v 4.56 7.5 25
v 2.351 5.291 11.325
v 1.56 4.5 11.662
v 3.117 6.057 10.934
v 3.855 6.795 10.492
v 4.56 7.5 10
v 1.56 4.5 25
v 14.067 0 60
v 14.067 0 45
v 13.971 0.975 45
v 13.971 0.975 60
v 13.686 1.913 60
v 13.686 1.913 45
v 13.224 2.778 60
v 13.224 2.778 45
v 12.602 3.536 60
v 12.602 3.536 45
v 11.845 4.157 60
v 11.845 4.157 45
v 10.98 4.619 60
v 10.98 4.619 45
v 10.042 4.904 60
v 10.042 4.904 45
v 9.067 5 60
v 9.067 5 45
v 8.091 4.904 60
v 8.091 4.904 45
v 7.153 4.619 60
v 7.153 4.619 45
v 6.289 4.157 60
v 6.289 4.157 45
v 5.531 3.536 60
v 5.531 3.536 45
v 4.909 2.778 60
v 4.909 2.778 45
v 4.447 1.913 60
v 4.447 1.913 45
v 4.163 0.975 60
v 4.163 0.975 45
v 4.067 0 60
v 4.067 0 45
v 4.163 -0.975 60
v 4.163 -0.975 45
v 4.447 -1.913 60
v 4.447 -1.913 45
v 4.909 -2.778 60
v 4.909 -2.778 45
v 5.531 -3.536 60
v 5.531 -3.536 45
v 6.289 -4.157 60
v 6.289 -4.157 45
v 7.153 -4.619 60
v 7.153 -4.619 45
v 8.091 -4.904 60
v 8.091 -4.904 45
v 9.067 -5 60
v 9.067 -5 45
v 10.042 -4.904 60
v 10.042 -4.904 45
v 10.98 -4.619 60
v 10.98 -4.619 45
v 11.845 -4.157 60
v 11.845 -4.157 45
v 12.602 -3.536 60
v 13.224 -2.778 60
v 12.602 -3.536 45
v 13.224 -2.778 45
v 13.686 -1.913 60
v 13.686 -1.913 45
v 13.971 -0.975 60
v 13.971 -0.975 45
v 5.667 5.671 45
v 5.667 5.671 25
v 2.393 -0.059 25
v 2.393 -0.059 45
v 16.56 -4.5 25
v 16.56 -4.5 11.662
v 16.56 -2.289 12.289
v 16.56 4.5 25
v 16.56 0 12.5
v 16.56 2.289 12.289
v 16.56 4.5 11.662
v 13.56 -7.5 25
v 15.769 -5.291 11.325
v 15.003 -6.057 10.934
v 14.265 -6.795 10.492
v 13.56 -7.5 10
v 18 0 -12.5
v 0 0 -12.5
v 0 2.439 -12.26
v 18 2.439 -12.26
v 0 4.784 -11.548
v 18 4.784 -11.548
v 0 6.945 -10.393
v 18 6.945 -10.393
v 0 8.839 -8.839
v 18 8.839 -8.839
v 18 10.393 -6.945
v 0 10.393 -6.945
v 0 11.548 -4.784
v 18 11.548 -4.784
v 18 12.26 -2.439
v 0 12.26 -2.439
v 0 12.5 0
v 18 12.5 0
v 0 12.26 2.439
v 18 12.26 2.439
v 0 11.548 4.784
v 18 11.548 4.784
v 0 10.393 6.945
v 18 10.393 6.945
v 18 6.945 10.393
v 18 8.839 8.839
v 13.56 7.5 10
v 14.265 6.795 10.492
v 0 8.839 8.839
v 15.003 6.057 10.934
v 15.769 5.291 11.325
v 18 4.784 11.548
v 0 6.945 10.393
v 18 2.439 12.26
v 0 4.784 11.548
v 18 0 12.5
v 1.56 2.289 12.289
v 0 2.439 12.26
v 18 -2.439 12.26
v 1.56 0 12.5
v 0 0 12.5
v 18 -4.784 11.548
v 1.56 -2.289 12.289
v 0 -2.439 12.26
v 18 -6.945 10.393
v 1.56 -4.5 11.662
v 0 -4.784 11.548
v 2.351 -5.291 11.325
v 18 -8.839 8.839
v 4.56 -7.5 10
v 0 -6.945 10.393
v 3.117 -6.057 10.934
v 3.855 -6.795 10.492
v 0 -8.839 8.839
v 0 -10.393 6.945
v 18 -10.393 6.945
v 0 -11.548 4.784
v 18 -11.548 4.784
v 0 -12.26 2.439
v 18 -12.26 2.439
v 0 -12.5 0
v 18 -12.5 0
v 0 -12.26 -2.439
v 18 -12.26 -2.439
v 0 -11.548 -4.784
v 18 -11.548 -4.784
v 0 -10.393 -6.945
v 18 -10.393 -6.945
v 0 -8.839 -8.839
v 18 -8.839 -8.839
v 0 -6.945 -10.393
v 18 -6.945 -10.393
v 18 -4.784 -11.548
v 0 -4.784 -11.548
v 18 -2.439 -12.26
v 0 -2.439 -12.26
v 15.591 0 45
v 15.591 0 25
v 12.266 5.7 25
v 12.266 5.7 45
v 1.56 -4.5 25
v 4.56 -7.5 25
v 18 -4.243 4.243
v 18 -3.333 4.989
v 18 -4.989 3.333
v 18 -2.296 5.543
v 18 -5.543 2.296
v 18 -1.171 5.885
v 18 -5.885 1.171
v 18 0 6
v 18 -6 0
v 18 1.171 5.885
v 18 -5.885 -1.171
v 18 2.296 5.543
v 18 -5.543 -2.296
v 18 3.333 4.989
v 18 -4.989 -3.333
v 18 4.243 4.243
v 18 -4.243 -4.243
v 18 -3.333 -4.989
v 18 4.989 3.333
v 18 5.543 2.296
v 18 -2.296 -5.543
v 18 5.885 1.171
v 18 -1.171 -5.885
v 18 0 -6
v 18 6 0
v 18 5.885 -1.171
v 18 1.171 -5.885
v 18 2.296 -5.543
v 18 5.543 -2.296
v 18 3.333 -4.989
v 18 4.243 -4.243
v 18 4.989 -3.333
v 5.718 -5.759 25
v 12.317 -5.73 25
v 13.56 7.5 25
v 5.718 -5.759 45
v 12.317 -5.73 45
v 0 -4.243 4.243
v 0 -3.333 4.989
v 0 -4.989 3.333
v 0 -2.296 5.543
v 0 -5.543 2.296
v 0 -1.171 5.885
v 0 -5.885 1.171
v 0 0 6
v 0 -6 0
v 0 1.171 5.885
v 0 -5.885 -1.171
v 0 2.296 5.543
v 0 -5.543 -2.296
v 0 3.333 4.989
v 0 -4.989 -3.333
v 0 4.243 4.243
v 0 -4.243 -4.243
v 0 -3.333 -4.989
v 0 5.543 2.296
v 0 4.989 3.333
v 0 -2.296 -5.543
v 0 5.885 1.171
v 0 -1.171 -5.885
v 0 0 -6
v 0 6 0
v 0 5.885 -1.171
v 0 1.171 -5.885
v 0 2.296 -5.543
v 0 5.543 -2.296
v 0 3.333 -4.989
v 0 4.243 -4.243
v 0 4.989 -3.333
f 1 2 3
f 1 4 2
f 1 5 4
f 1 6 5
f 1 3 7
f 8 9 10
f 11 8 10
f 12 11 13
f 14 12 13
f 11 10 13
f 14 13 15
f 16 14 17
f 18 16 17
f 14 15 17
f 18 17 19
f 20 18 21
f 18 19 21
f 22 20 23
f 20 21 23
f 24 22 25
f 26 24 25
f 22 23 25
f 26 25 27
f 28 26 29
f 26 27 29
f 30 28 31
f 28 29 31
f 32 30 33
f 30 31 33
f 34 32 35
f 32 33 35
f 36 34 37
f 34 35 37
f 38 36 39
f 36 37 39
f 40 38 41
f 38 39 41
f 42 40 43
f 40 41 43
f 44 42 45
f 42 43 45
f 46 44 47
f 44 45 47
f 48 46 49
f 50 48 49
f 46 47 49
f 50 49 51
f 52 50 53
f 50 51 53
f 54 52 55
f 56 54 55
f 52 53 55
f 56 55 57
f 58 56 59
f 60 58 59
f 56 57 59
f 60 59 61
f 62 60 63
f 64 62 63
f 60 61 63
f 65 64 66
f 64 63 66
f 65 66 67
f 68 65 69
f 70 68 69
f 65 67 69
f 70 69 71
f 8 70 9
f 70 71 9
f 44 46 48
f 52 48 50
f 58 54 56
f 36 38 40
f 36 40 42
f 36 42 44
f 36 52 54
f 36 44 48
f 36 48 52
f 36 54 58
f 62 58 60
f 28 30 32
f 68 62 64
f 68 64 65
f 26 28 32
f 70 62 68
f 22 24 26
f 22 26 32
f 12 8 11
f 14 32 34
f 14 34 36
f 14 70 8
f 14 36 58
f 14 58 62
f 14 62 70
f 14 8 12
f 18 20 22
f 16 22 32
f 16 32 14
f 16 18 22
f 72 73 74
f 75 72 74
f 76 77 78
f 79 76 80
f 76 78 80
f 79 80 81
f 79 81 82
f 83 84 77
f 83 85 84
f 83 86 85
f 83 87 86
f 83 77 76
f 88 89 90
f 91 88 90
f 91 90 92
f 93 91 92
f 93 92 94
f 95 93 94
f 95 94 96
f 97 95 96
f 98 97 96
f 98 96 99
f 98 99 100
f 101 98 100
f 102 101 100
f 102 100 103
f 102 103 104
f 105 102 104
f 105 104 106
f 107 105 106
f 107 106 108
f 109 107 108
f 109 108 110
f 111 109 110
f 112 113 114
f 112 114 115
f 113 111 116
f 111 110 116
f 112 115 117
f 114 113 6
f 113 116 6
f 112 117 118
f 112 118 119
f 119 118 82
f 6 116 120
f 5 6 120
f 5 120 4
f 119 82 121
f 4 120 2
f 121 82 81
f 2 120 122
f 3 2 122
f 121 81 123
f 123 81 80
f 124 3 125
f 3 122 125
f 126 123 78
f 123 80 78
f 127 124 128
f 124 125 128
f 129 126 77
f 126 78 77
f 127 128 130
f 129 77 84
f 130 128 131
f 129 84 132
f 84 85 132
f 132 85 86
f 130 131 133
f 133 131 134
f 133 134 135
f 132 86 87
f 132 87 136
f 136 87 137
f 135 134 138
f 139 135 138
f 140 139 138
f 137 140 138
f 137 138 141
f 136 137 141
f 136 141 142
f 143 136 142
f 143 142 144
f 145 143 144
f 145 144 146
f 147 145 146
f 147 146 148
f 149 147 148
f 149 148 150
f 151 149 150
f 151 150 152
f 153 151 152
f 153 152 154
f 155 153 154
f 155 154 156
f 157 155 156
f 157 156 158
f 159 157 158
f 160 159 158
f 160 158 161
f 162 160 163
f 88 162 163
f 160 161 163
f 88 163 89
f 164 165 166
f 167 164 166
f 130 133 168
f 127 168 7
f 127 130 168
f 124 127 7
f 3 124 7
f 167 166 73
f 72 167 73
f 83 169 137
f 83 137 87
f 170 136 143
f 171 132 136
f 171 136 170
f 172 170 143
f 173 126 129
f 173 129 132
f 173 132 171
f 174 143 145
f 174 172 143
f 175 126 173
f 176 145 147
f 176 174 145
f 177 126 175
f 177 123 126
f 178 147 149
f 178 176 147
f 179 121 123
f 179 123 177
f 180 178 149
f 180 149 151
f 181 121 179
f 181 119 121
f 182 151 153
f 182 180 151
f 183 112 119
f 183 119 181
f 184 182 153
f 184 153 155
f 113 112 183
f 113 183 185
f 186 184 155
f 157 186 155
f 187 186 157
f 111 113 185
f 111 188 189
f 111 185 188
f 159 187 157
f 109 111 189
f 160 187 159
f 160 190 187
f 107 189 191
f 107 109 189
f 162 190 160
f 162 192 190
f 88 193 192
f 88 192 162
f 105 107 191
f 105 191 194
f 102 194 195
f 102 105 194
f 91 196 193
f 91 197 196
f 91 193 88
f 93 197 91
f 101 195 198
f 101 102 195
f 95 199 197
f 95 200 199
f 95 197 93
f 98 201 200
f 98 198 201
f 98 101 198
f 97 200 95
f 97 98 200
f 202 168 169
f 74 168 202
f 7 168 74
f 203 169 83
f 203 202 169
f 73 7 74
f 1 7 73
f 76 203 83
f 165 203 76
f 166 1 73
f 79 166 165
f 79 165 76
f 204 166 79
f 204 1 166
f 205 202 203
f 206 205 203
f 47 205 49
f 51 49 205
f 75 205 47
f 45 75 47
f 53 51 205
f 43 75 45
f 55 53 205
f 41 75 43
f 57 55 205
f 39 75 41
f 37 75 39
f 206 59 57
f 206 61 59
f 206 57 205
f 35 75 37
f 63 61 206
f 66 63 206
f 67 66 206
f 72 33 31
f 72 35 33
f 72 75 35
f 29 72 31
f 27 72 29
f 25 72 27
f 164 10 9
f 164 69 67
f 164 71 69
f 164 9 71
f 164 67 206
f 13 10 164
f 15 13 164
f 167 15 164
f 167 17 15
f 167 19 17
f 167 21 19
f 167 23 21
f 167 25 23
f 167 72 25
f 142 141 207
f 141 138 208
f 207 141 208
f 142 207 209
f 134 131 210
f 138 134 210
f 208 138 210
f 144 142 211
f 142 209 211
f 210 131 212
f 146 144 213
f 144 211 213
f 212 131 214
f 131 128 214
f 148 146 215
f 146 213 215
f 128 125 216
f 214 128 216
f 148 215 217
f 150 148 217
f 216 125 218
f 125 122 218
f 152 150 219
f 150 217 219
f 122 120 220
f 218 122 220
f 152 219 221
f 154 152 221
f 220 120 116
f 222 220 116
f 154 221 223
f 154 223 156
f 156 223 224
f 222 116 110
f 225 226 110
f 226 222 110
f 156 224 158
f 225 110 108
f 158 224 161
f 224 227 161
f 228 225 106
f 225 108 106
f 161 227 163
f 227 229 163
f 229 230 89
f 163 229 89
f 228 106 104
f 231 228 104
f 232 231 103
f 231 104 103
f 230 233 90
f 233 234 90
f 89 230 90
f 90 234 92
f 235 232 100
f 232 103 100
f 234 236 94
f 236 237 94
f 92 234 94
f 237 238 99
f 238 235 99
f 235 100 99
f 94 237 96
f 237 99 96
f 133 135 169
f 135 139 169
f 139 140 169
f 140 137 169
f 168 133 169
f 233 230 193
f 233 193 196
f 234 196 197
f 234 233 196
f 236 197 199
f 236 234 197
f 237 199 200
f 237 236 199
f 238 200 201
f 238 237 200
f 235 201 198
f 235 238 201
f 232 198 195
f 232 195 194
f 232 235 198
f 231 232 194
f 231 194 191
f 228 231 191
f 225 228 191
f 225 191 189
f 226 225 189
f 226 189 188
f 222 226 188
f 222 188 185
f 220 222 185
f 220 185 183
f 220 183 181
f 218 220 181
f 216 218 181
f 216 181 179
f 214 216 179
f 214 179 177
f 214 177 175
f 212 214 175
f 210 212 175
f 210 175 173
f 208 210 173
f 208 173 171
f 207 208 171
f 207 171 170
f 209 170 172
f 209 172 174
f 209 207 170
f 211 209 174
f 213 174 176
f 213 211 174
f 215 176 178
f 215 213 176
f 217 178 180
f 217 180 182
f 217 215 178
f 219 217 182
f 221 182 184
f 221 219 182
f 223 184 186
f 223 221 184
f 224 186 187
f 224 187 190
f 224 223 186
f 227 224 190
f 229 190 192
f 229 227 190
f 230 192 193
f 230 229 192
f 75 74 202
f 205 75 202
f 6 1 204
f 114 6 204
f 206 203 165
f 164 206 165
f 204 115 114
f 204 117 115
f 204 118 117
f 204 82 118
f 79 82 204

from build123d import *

# Parameters (mm, degrees)
SKETCH1_R               = 12.5
SKETCH1_R_2             = 6
BOSS_EXTRUDE1_DEPTH     = 18
SKETCH2_W               = 15
SKETCH2_H               = 15
BOSS_EXTRUDE2_DEPTH     = 25
BOSS_EXTRUDE3_DEPTH     = 20
CHAMFER1_SIZE           = 3
SKETCH4_R               = 5
BOSS_EXTRUDE4_DEPTH     = 15
CUT_EXTRUDE2_DEPTH      = 64.876834612
CUT_EXTRUDE2_DEPTH_BACK = 64.876834612
SKETCH1_3_R             = 6


with BuildPart() as part:
    # Sketch1 → Boss-Extrude1 (new body)
    with BuildSketch(Plane(origin=(0, 0, 0), x_dir=(0, 0, -1), z_dir=(1, 0, 0))):
        Circle(SKETCH1_R)
        Circle(SKETCH1_R_2, mode=Mode.SUBTRACT)
    extrude(amount=BOSS_EXTRUDE1_DEPTH)

    # Sketch2 → Boss-Extrude2 (add)
    with BuildSketch(Plane.XY):
        with Locations((9.060136008, 0)):
            Rectangle(SKETCH2_W, SKETCH2_H)
    extrude(amount=BOSS_EXTRUDE2_DEPTH)

    # Sketch3 → Boss-Extrude3 (add)
    with BuildSketch(Plane.XY.offset(25)):
        Polygon((12.266098975, 5.700421756), (5.666853814, 5.671037358), (2.392678869, -0.058768796), (5.717749085, -5.759190552), (12.316994245, -5.729806154), (15.591169191, 0), align=None)
    extrude(amount=BOSS_EXTRUDE3_DEPTH)

    # Chamfer1
    chamfer1_edges = [part.edges().sort_by_distance(p)[0] for p in [
        (1.560136008, -7.5, 17.5),
        (16.560136008, 7.5, 17.5),
        (1.560136008, 7.5, 17.5),
        (16.560136008, -7.5, 17.5),
    ]]
    chamfer(chamfer1_edges, length=CHAMFER1_SIZE)

    # Sketch4 → Boss-Extrude4 (add)
    with BuildSketch(Plane.XY.offset(45)):
        with Locations((9.066652134, 0)):
            Circle(SKETCH4_R)
    extrude(amount=BOSS_EXTRUDE4_DEPTH)

    # Sketch1<3> → Cut-Extrude2 (cut, two sides: drawn at the far end of the back side and taken through both)
    with BuildSketch(Plane(origin=(0, 0, 0), x_dir=(0, 0, -1), z_dir=(1, 0, 0)).offset(-CUT_EXTRUDE2_DEPTH_BACK)):
        Circle(SKETCH1_3_R)
    extrude(amount=CUT_EXTRUDE2_DEPTH + CUT_EXTRUDE2_DEPTH_BACK, mode=Mode.SUBTRACT)


solid = part.part
